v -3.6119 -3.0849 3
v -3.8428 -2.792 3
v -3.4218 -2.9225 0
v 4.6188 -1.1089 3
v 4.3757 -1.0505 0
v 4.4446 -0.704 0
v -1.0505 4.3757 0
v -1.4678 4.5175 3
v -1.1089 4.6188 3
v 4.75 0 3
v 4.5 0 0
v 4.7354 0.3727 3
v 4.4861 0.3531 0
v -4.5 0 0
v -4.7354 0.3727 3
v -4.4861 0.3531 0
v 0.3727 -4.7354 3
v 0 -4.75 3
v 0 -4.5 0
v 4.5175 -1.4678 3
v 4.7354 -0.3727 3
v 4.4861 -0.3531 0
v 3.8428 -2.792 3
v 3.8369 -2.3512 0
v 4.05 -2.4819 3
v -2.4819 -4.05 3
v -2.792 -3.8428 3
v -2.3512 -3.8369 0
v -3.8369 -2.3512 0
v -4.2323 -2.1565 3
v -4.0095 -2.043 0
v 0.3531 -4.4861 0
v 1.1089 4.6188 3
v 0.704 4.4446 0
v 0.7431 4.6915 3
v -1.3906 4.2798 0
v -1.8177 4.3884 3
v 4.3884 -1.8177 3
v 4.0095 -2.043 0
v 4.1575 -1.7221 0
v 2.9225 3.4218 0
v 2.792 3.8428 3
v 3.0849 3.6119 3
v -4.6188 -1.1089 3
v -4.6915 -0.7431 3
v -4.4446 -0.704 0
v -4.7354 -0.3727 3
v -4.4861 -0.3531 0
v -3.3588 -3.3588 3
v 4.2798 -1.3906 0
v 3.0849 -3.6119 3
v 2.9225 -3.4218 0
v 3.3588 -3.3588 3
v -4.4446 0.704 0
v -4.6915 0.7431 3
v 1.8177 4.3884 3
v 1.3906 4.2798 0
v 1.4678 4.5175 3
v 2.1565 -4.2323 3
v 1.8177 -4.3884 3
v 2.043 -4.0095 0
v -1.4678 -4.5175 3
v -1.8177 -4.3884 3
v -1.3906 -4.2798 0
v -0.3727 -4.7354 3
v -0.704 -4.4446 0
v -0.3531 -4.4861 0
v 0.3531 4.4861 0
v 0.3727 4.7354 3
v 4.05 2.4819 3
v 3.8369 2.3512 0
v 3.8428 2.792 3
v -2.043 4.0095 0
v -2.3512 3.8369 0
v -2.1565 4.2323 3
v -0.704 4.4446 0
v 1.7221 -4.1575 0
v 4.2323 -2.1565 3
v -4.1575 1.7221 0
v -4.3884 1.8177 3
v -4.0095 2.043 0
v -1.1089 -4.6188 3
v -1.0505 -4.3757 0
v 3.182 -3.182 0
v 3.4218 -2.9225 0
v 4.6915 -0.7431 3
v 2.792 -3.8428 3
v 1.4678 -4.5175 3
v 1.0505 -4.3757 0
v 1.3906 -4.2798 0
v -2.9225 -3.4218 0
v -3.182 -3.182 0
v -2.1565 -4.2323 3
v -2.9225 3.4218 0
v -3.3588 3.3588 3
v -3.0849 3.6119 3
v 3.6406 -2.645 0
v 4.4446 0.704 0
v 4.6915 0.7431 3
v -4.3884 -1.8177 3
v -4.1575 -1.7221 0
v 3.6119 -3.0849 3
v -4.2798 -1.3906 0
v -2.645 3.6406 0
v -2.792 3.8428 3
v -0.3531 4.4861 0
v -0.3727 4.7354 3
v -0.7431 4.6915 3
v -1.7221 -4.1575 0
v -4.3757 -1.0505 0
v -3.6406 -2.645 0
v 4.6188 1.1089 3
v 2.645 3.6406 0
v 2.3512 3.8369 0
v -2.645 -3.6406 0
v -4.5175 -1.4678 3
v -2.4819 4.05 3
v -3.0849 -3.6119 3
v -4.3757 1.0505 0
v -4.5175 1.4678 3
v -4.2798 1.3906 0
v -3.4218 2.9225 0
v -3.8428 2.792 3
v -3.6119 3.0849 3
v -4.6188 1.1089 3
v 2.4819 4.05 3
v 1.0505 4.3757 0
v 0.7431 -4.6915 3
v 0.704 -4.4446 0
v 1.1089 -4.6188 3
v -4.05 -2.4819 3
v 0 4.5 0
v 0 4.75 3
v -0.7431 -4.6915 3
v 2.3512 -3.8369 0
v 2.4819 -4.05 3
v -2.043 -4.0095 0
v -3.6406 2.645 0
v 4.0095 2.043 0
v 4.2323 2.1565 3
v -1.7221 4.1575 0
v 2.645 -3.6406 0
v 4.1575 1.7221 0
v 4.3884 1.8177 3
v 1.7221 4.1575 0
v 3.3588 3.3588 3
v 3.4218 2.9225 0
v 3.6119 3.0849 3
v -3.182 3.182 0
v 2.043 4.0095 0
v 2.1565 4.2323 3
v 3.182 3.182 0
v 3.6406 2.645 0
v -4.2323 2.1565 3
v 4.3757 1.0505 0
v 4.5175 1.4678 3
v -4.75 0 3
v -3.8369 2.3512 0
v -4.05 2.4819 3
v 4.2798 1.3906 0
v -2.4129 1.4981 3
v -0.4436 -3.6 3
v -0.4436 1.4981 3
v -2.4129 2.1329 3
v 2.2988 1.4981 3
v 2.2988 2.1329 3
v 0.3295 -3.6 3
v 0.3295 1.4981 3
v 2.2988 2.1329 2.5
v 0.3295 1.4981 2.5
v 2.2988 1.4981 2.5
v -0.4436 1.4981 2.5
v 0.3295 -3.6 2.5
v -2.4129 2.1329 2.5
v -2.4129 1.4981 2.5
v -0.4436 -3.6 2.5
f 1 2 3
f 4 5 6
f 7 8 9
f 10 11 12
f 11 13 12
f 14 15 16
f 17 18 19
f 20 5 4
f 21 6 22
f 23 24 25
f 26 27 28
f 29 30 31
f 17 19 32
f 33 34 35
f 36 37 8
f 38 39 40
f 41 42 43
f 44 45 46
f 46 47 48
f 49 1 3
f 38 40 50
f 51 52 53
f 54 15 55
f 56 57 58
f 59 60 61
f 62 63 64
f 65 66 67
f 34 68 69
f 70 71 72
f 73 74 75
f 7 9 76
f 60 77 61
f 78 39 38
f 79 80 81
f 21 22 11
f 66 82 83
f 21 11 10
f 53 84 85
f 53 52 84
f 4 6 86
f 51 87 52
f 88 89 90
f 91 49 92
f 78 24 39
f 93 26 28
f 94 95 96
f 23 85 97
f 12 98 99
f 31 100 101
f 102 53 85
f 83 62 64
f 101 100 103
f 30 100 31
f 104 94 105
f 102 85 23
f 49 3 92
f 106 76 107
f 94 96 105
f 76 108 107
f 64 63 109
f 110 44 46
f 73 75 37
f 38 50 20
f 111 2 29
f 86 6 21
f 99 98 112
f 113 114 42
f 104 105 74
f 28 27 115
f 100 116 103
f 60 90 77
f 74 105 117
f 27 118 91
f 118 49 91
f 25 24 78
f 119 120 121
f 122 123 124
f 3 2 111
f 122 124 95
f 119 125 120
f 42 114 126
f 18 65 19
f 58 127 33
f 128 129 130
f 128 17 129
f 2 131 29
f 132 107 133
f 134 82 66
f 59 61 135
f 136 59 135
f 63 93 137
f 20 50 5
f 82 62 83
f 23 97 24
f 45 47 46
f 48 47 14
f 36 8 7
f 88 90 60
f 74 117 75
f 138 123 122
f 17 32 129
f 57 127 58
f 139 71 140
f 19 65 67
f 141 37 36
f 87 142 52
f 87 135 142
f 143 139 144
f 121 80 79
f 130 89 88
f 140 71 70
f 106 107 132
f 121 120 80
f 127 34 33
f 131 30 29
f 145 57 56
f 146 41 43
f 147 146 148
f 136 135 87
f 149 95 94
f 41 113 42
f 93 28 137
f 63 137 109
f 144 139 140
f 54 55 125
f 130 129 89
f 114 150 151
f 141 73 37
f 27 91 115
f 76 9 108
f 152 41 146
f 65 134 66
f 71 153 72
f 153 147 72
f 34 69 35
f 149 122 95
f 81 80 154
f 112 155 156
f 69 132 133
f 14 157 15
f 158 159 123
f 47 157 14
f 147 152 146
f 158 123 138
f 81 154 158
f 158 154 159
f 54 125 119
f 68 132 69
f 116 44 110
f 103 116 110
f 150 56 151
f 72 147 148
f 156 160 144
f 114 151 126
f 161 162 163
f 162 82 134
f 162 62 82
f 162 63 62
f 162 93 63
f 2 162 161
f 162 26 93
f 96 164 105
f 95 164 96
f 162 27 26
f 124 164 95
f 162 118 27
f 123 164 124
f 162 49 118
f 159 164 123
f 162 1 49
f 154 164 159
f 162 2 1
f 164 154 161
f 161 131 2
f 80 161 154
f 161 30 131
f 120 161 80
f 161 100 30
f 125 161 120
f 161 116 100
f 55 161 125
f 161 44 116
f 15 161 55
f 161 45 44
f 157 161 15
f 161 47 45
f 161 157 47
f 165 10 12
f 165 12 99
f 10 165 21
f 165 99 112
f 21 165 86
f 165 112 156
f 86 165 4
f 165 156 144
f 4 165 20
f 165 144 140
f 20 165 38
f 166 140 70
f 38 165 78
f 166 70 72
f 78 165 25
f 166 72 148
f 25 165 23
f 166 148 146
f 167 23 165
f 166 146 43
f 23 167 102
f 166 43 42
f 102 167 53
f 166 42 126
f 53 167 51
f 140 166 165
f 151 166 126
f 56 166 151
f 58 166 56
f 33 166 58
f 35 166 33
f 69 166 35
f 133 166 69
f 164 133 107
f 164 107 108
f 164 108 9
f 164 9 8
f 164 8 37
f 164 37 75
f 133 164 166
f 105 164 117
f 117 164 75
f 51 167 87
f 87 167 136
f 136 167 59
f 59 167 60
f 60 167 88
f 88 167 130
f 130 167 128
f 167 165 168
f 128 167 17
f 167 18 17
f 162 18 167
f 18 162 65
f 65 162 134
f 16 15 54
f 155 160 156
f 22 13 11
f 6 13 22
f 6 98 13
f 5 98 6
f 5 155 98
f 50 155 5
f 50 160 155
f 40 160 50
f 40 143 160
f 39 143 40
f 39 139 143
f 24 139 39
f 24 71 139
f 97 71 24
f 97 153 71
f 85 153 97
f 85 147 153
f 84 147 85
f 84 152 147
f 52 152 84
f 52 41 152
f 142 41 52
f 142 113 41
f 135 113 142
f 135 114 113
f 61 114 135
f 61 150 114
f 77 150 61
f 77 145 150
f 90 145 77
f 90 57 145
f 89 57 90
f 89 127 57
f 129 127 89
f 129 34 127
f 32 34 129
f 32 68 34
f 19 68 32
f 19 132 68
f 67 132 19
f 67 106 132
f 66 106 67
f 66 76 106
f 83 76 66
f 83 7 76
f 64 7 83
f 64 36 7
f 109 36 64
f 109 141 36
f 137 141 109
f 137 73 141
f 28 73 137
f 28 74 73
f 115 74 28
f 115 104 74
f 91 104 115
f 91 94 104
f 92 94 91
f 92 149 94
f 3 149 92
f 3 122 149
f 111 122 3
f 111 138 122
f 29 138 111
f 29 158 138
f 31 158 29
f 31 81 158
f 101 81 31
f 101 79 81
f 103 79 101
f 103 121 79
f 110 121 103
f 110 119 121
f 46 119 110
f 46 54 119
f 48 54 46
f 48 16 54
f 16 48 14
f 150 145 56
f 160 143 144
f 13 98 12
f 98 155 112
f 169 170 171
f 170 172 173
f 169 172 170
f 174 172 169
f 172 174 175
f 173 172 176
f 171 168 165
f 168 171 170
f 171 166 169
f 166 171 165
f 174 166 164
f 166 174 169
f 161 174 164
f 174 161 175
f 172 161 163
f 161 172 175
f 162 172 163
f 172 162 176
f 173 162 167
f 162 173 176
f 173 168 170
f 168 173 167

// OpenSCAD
// Y-end_WS

$fn=80;

//y_axis_front();
cork();

color("blue", 1.0) {
//translate([182-1, 12, 20]) rotate([90, 0, 0]) endstop();
//translate([178, 4, 4]) rotate([90, 0, 180]) endstop_mech();
}

module y_axis_front() {
difference() {
    cube([215,20,20]);
        //cutout ball bearings
        translate([92.2, 12, 27])
        rotate([90,0,0])
        cylinder(h=10, r=24); 
        //cutout rods
        translate([215-85-76, 6, 9.5]) cylinder (h = 20, r=4.15);
        translate([215-85, 6, 9.5]) cylinder (h = 20, r=4.15);
        //cutout screws
        rotate([90,0,0]) translate([30,10,-25])  cylinder (h=40, r=2.6);
        rotate([90,0,0]) translate([215-54,10,-25])  cylinder (h=10, r=2.6);
        rotate([90,0,0]) translate([215-54,10,-22])  cylinder (h=25, r=2.6);
        rotate([90,0,0]) translate([215-54,10,-22+4])  cylinder (h=25, d=9.5);
        rotate([90,0,0]) translate([215-29.9,15.3,-25]) cylinder (h = 40, r=1.4);
        rotate([90,0,0]) translate([215-29.9+19,15.3,-25]) cylinder (h = 40, r=1.4);
        rotate([90,0,0]) translate([215-78.9+3.8,17.27,-21]) cylinder (h = 35, r=1.4);
       rotate([90,0,0]) translate([215-78.9+22.45,17.27,-21]) cylinder (h = 35, r=1.4);
        //counter sinks
        rotate([90,0,0]) translate([30,10,-5]) cylinder (h=20, r=5);
        rotate([90,0,0]) translate([215-54,10,-16]) cylinder (h=7, r=5);
        rotate([90,0,0]) translate([215-29.9,15.3,-4]) cylinder (h=20, r=3);
        rotate([90,0,0]) translate([215-29.9+19,15.3,-4]) cylinder (h=20, r=3);
        rotate([90,0,0]) translate([92.2,12,-30]) cylinder (h=40, r=1.4);
        translate([215-6.5, -1, 9]) cube([10, 12, 12]);
        translate([215-41, 9, 9]) cube([8.1, 12, 12]);
       translate([215-34, 3, 9]) cube([28, 14, 12]);
       translate([215-78.9, 3, 6.3]) cube([47, 9.7, 14.7]);
       translate([215-78.9, 4.8, 3.3]) cube([47, 1.5, 17.7]);
}
//support for optical endstop
difference() {
    union() {
    translate([215-32.9, 9, 8]) cube([6, 11, 12]);
    translate([215-32.9+6+12.5, 9, 8]) cube([14.4, 8, 12]);
    }
    rotate([90,0,0]) translate([215-29.9,15.3,-25]) cylinder (h=40, r=1.4);
    rotate([90,0,0]) translate([215-29.90+19,15.3,-25]) cylinder (h=40, r=1.4);
}
//support mech. endstop
translate([215-78.9, 3, 6.3]) cube([5, 1.8, 9]); 
translate([215-78.9+5+30, 3, 6.3]) cube([5, 1.8, 9]); 
}

module cork() {
    difference() {
    cylinder(d1=9, d2=9.5, h=3);
    string="T";
    translate([-2.6, -3.6, 2.5])
    linear_extrude(2.0) text(string, size = 6, direction = "ltr", spacing = 1 );  
    }
}

module endstop_mech() {
    cube([39.5, 16.2, 1.6]);
    translate([4, 2, 0]) cube([7, 12, 7]);
    translate([20.5, 7.5, 0]) cube([13, 9, 7]);
}
